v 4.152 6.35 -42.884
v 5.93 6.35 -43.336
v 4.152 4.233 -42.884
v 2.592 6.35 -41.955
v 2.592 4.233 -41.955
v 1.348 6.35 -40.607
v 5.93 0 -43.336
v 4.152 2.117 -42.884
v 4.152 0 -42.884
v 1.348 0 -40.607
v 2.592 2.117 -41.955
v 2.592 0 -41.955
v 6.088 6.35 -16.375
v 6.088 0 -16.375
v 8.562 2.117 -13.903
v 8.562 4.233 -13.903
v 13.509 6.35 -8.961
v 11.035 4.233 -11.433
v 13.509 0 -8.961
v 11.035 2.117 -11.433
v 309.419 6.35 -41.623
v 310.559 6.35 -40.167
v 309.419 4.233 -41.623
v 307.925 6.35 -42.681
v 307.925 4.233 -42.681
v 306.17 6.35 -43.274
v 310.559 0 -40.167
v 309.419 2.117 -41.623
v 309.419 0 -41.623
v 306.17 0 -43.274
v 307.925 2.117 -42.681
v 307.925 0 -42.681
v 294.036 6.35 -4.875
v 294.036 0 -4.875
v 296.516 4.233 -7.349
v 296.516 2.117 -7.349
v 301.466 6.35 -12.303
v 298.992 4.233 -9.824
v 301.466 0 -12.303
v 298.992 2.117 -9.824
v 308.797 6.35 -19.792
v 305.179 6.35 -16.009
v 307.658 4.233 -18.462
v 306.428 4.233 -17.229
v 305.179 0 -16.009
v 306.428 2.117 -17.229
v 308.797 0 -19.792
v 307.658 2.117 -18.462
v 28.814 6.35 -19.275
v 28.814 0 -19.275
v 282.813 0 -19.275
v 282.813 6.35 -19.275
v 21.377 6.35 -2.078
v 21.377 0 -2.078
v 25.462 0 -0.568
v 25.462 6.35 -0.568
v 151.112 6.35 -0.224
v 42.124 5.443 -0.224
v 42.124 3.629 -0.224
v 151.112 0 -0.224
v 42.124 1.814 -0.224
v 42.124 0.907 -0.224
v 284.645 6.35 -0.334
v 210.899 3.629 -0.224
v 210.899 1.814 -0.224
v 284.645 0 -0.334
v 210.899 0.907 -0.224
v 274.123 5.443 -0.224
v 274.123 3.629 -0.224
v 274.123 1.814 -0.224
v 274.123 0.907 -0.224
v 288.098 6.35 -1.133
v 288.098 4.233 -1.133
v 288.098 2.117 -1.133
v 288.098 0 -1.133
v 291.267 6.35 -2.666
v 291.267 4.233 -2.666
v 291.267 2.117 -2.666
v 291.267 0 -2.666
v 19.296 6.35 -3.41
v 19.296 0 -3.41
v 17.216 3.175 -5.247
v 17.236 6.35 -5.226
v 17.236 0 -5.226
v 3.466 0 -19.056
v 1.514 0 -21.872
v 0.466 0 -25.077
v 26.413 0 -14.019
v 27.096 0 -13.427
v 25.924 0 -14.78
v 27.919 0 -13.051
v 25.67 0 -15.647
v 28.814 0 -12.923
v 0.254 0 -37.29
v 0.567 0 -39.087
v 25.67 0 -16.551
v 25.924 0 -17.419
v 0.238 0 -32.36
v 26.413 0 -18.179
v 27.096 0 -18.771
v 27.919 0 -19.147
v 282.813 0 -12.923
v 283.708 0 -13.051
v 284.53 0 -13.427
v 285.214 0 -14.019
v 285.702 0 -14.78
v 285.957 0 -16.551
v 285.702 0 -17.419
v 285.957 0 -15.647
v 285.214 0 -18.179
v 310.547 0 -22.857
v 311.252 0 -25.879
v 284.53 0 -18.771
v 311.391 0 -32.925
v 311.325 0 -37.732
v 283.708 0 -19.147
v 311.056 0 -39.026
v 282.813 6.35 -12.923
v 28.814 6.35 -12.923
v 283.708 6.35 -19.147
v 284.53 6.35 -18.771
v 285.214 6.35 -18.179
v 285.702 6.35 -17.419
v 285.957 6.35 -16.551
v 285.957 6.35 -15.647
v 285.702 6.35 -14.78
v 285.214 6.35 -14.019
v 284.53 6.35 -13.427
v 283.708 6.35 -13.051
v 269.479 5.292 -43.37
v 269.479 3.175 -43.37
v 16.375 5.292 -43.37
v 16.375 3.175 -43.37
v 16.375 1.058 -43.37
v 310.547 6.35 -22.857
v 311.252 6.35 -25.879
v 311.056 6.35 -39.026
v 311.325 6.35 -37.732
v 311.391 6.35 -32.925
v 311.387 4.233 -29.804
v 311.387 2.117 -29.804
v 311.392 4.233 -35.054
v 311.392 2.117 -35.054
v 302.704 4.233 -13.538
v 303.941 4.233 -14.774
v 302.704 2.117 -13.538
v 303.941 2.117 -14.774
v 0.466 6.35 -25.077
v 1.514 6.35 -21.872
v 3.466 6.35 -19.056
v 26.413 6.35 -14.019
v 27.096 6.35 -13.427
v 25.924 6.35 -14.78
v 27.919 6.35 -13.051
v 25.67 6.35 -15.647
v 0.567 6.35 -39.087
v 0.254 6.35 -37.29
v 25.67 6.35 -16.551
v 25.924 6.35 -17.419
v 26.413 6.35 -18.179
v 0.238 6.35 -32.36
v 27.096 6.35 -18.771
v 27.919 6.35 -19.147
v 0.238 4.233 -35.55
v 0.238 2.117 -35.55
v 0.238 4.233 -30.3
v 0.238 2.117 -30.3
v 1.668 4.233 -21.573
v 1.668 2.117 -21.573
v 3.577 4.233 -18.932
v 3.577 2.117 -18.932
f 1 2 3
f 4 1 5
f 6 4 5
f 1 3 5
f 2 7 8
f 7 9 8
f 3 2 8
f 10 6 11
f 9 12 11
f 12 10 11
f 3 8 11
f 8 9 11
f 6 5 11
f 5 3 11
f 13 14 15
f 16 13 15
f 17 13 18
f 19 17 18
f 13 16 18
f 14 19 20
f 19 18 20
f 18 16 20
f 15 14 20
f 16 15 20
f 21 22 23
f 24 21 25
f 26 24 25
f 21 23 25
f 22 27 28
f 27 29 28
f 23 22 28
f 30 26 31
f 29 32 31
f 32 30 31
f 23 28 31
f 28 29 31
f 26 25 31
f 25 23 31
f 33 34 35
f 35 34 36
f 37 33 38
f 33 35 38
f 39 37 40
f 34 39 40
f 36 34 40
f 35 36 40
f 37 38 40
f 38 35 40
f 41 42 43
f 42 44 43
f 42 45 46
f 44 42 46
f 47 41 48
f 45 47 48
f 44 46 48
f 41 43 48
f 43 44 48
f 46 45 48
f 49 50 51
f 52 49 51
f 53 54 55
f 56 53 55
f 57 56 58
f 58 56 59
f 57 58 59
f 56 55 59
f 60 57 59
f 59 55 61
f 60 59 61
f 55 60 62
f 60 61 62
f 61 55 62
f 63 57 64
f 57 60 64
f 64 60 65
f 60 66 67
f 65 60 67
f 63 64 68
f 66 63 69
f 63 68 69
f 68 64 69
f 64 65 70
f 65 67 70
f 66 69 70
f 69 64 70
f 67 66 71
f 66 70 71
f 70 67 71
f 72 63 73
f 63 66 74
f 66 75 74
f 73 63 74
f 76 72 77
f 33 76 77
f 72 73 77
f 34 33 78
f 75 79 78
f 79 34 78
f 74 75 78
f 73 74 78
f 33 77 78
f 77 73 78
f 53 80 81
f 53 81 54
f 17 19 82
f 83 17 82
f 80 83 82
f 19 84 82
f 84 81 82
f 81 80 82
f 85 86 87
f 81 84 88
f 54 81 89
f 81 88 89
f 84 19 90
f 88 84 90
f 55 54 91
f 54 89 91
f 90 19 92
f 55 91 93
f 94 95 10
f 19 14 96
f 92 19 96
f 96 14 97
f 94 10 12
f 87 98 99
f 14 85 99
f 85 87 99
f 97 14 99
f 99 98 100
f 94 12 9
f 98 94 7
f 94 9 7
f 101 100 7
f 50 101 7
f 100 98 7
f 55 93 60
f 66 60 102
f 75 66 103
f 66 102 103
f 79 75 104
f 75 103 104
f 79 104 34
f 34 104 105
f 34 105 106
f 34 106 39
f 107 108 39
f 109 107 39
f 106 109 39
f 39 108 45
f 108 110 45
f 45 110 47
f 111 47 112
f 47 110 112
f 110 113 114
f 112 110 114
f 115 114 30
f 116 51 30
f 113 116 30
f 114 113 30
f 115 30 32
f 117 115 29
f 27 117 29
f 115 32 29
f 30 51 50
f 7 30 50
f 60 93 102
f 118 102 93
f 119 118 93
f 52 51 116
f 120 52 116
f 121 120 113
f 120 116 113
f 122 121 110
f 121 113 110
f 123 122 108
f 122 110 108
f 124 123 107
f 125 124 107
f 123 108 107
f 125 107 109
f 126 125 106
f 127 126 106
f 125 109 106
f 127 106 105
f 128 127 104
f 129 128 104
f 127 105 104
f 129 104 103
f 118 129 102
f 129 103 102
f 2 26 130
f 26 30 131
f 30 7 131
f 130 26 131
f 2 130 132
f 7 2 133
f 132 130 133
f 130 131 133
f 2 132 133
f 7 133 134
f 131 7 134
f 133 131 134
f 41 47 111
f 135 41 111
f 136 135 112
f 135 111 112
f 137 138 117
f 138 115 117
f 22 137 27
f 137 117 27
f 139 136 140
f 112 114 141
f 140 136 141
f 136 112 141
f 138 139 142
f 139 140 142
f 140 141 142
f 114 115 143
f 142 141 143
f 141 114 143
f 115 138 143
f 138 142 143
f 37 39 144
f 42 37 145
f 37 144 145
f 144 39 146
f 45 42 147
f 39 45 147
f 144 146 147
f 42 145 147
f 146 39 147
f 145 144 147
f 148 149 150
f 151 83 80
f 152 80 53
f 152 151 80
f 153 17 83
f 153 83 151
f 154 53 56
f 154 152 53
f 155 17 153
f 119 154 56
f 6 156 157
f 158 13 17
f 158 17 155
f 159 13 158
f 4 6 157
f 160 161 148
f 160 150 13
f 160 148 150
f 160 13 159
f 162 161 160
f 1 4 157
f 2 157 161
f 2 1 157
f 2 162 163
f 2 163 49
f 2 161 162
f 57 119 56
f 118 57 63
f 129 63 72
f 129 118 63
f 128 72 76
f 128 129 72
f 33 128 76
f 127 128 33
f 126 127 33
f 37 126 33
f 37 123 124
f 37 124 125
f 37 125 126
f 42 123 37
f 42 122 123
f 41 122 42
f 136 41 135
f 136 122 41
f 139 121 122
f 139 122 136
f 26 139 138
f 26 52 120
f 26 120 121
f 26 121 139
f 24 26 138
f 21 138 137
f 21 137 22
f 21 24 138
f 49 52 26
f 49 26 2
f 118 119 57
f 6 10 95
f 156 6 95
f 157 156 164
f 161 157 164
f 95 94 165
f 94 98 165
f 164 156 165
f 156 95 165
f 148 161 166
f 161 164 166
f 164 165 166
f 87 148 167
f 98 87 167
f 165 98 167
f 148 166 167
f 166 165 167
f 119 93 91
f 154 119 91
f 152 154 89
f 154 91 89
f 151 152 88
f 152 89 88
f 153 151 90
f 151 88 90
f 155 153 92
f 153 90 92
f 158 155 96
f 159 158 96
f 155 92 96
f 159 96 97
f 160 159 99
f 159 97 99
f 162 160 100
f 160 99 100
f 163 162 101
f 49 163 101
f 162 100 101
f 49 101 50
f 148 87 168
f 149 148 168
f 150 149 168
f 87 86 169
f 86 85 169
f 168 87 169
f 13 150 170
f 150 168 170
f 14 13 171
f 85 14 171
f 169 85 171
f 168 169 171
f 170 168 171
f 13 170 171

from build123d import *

# Parameters (mm, degrees)
BOSS_EXTRUDE3_DEPTH = 6.35
CUT_EXTRUDE2_DEPTH  = 315.468278946


with BuildPart() as part:
    # Sketch7 → Boss-Extrude3 (new body)
    with BuildSketch(Plane(origin=(0, 0, 0), x_dir=(1, 0, 0), z_dir=(0, 1, 0))):
        with BuildLine():
            add(Edge.make_bspline(
                [(185.1020682, 43.3705), (128.8643346, 43.3705), (72.6196922, 43.3705), (16.3750752, 43.3705)],
                knots=[0, 0, 0, 0, 1, 1, 1, 1], degree=3))
            add(Edge.make_bspline(
                [(16.3750752, 43.3705), (14.6249644, 43.3705), (12.881737, 43.3705), (11.1316262, 43.3705)],
                knots=[0, 0, 0, 0, 1, 1, 1, 1], degree=3))
            add(Edge.make_bspline(
                [(11.1316262, 43.3705), (10.6424476, 43.3705), (6.4187324, 43.3909978), (5.9295284, 43.3360068)],
                knots=[0, 0, 0, 0, 1, 1, 1, 1], degree=3))
            add(Edge.make_bspline(
                [(5.9295284, 43.3360068), (4.0760904, 43.1430938), (2.4017732, 42.1439848), (1.3475716, 40.607488)],
                knots=[0, 0, 0, 0, 1, 1, 1, 1], degree=3))
            add(Edge.make_bspline(
                [(1.3475716, 40.607488), (0.1348994, 38.8367016), (0.238252, 37.5137934), (0.238252, 35.550094)],
                knots=[0, 0, 0, 0, 1, 1, 1, 1], degree=3))
            add(Edge.make_bspline(
                [(0.238252, 35.550094), (0.238252, 33.7999578), (0.238252, 32.049847), (0.238252, 30.2997616)],
                knots=[0, 0, 0, 0, 1, 1, 1, 1], degree=3))
            add(Edge.make_bspline(
                [(0.238252, 30.2997616), (0.238252, 28.5565342), (0.1279906, 26.827099), (0.4656328, 25.0769882)],
                knots=[0, 0, 0, 0, 1, 1, 1, 1], degree=3))
            add(Edge.make_bspline(
                [(0.4656328, 25.0769882), (1.2786868, 20.8808574), (3.3112964, 19.1514222), (6.0880498, 16.3746942)],
                knots=[0, 0, 0, 0, 1, 1, 1, 1], degree=3))
            add(Edge.make_bspline(
                [(6.0880498, 16.3746942), (8.5616288, 13.9010898), (11.0352078, 11.4343942), (13.5087868, 8.9608406)],
                knots=[0, 0, 0, 0, 1, 1, 1, 1], degree=3))
            add(Edge.make_bspline(
                [(13.5087868, 8.9608406), (14.7421092, 7.7206094), (15.975457, 6.4872616), (17.2156882, 5.2470304)],
                knots=[0, 0, 0, 0, 1, 1, 1, 1], degree=3))
            add(Edge.make_bspline(
                [(17.2156882, 5.2470304), (18.4697116, 3.993007), (19.7926198, 2.9112464), (21.3773766, 2.0775422)],
                knots=[0, 0, 0, 0, 1, 1, 1, 1], degree=3))
            add(Edge.make_bspline(
                [(21.3773766, 2.0775422), (25.104979, 0.1000506), (27.6474428, 0.2240788), (31.6368684, 0.2240788)],
                knots=[0, 0, 0, 0, 1, 1, 1, 1], degree=3))
            add(Edge.make_bspline(
                [(31.6368684, 0.2240788), (35.1302066, 0.2240788), (38.6304028, 0.2240788), (42.123741, 0.2240788)],
                knots=[0, 0, 0, 0, 1, 1, 1, 1], degree=3))
            add(Edge.make_bspline(
                [(42.123741, 0.2240788), (70.2632834, 0.2240788), (98.3959424, 0.2240788), (126.5354848, 0.2240788)],
                knots=[0, 0, 0, 0, 1, 1, 1, 1], degree=3))
            add(Edge.make_bspline(
                [(126.5354848, 0.2240788), (154.6543516, 0.2240788), (182.7732184, 0.2240788), (210.8989686, 0.2240788)],
                knots=[0, 0, 0, 0, 1, 1, 1, 1], degree=3))
            add(Edge.make_bspline(
                [(210.8989686, 0.2240788), (224.9480642, 0.2240788), (238.9971598, 0.2240788), (253.0531642, 0.2240788)],
                knots=[0, 0, 0, 0, 1, 1, 1, 1], degree=3))
            add(Edge.make_bspline(
                [(253.0531642, 0.2240788), (260.0742576, 0.2240788), (267.1022598, 0.2240788), (274.1233532, 0.2240788)],
                knots=[0, 0, 0, 0, 1, 1, 1, 1], degree=3))
            add(Edge.make_bspline(
                [(274.1233532, 0.2240788), (275.3498176, 0.2240788), (283.4113204, 0.1895856), (284.644719, 0.3343402)],
                knots=[0, 0, 0, 0, 1, 1, 1, 1], degree=3))
            add(Edge.make_bspline(
                [(284.644719, 0.3343402), (288.2000332, 0.7477252), (291.5072656, 2.3462488), (294.0360134, 4.8749458)],
                knots=[0, 0, 0, 0, 1, 1, 1, 1], degree=3))
            add(Edge.make_bspline(
                [(294.0360134, 4.8749458), (296.5183808, 7.3485248), (298.9919344, 9.8221038), (301.4655134, 12.3025662)],
                knots=[0, 0, 0, 0, 1, 1, 1, 1], degree=3))
            add(Edge.make_bspline(
                [(301.4655134, 12.3025662), (302.7057192, 13.535914), (303.939067, 14.7761706), (305.1793236, 16.009493)],
                knots=[0, 0, 0, 0, 1, 1, 1, 1], degree=3))
            add(Edge.make_bspline(
                [(305.1793236, 16.009493), (306.4126714, 17.2497496), (307.7286708, 18.3866028), (308.7966646, 19.7922134)],
                knots=[0, 0, 0, 0, 1, 1, 1, 1], degree=3))
            add(Edge.make_bspline(
                [(308.7966646, 19.7922134), (311.3598294, 23.1684068), (311.387363, 25.8831334), (311.387363, 29.8036742)],
                knots=[0, 0, 0, 0, 1, 1, 1, 1], degree=3))
            add(Edge.make_bspline(
                [(311.387363, 29.8036742), (311.387363, 31.5537596), (311.3923668, 33.3038704), (311.3923668, 35.0539812)],
                knots=[0, 0, 0, 0, 1, 1, 1, 1], degree=3))
            add(Edge.make_bspline(
                [(311.3923668, 35.0539812), (311.3923668, 36.8247676), (311.5163696, 38.4784346), (310.5586626, 40.1665186)],
                knots=[0, 0, 0, 0, 1, 1, 1, 1], degree=3))
            add(Edge.make_bspline(
                [(310.5586626, 40.1665186), (309.6284638, 41.7994846), (308.0230822, 42.9363632), (306.1696188, 43.2740054)],
                knots=[0, 0, 0, 0, 1, 1, 1, 1], degree=3))
            add(Edge.make_bspline(
                [(306.1696188, 43.2740054), (305.3910326, 43.4117496), (301.759874, 43.3705), (300.9812624, 43.3705)],
                knots=[0, 0, 0, 0, 1, 1, 1, 1], degree=3))
            add(Edge.make_bspline(
                [(300.9812624, 43.3705), (297.4810662, 43.3705), (293.98087, 43.3705), (290.4806738, 43.3705)],
                knots=[0, 0, 0, 0, 1, 1, 1, 1], degree=3))
            add(Edge.make_bspline(
                [(290.4806738, 43.3705), (283.4802306, 43.3705), (276.4797874, 43.3705), (269.4793442, 43.3705)],
                knots=[0, 0, 0, 0, 1, 1, 1, 1], degree=3))
            add(Edge.make_bspline(
                [(269.4793442, 43.3705), (241.353594, 43.3705), (213.2278184, 43.3705), (185.1020682, 43.3705)],
                knots=[0, 0, 0, 0, 1, 1, 1, 1], degree=3))
        make_face()
    extrude(amount=BOSS_EXTRUDE3_DEPTH)

    # Sketch8 → Cut-Extrude2 (cut, through all)
    with BuildSketch(Plane(origin=(0, 0, 0), x_dir=(1, 0, 0), z_dir=(0, 1, 0))):
        with BuildLine():
            Line((28.81376, 19.2754504), (282.812968063, 19.2754504))
            ThreePointArc((282.812968063, 19.2754504), (285.989365063, 16.0990534), (282.812968063, 12.9226564))
            Line((282.812968063, 12.9226564), (28.81376, 12.9226564))
            ThreePointArc((28.81376, 12.9226564), (25.637363, 16.0990534), (28.81376, 19.2754504))
        make_face()
    extrude(amount=CUT_EXTRUDE2_DEPTH, mode=Mode.SUBTRACT)


solid = part.part
